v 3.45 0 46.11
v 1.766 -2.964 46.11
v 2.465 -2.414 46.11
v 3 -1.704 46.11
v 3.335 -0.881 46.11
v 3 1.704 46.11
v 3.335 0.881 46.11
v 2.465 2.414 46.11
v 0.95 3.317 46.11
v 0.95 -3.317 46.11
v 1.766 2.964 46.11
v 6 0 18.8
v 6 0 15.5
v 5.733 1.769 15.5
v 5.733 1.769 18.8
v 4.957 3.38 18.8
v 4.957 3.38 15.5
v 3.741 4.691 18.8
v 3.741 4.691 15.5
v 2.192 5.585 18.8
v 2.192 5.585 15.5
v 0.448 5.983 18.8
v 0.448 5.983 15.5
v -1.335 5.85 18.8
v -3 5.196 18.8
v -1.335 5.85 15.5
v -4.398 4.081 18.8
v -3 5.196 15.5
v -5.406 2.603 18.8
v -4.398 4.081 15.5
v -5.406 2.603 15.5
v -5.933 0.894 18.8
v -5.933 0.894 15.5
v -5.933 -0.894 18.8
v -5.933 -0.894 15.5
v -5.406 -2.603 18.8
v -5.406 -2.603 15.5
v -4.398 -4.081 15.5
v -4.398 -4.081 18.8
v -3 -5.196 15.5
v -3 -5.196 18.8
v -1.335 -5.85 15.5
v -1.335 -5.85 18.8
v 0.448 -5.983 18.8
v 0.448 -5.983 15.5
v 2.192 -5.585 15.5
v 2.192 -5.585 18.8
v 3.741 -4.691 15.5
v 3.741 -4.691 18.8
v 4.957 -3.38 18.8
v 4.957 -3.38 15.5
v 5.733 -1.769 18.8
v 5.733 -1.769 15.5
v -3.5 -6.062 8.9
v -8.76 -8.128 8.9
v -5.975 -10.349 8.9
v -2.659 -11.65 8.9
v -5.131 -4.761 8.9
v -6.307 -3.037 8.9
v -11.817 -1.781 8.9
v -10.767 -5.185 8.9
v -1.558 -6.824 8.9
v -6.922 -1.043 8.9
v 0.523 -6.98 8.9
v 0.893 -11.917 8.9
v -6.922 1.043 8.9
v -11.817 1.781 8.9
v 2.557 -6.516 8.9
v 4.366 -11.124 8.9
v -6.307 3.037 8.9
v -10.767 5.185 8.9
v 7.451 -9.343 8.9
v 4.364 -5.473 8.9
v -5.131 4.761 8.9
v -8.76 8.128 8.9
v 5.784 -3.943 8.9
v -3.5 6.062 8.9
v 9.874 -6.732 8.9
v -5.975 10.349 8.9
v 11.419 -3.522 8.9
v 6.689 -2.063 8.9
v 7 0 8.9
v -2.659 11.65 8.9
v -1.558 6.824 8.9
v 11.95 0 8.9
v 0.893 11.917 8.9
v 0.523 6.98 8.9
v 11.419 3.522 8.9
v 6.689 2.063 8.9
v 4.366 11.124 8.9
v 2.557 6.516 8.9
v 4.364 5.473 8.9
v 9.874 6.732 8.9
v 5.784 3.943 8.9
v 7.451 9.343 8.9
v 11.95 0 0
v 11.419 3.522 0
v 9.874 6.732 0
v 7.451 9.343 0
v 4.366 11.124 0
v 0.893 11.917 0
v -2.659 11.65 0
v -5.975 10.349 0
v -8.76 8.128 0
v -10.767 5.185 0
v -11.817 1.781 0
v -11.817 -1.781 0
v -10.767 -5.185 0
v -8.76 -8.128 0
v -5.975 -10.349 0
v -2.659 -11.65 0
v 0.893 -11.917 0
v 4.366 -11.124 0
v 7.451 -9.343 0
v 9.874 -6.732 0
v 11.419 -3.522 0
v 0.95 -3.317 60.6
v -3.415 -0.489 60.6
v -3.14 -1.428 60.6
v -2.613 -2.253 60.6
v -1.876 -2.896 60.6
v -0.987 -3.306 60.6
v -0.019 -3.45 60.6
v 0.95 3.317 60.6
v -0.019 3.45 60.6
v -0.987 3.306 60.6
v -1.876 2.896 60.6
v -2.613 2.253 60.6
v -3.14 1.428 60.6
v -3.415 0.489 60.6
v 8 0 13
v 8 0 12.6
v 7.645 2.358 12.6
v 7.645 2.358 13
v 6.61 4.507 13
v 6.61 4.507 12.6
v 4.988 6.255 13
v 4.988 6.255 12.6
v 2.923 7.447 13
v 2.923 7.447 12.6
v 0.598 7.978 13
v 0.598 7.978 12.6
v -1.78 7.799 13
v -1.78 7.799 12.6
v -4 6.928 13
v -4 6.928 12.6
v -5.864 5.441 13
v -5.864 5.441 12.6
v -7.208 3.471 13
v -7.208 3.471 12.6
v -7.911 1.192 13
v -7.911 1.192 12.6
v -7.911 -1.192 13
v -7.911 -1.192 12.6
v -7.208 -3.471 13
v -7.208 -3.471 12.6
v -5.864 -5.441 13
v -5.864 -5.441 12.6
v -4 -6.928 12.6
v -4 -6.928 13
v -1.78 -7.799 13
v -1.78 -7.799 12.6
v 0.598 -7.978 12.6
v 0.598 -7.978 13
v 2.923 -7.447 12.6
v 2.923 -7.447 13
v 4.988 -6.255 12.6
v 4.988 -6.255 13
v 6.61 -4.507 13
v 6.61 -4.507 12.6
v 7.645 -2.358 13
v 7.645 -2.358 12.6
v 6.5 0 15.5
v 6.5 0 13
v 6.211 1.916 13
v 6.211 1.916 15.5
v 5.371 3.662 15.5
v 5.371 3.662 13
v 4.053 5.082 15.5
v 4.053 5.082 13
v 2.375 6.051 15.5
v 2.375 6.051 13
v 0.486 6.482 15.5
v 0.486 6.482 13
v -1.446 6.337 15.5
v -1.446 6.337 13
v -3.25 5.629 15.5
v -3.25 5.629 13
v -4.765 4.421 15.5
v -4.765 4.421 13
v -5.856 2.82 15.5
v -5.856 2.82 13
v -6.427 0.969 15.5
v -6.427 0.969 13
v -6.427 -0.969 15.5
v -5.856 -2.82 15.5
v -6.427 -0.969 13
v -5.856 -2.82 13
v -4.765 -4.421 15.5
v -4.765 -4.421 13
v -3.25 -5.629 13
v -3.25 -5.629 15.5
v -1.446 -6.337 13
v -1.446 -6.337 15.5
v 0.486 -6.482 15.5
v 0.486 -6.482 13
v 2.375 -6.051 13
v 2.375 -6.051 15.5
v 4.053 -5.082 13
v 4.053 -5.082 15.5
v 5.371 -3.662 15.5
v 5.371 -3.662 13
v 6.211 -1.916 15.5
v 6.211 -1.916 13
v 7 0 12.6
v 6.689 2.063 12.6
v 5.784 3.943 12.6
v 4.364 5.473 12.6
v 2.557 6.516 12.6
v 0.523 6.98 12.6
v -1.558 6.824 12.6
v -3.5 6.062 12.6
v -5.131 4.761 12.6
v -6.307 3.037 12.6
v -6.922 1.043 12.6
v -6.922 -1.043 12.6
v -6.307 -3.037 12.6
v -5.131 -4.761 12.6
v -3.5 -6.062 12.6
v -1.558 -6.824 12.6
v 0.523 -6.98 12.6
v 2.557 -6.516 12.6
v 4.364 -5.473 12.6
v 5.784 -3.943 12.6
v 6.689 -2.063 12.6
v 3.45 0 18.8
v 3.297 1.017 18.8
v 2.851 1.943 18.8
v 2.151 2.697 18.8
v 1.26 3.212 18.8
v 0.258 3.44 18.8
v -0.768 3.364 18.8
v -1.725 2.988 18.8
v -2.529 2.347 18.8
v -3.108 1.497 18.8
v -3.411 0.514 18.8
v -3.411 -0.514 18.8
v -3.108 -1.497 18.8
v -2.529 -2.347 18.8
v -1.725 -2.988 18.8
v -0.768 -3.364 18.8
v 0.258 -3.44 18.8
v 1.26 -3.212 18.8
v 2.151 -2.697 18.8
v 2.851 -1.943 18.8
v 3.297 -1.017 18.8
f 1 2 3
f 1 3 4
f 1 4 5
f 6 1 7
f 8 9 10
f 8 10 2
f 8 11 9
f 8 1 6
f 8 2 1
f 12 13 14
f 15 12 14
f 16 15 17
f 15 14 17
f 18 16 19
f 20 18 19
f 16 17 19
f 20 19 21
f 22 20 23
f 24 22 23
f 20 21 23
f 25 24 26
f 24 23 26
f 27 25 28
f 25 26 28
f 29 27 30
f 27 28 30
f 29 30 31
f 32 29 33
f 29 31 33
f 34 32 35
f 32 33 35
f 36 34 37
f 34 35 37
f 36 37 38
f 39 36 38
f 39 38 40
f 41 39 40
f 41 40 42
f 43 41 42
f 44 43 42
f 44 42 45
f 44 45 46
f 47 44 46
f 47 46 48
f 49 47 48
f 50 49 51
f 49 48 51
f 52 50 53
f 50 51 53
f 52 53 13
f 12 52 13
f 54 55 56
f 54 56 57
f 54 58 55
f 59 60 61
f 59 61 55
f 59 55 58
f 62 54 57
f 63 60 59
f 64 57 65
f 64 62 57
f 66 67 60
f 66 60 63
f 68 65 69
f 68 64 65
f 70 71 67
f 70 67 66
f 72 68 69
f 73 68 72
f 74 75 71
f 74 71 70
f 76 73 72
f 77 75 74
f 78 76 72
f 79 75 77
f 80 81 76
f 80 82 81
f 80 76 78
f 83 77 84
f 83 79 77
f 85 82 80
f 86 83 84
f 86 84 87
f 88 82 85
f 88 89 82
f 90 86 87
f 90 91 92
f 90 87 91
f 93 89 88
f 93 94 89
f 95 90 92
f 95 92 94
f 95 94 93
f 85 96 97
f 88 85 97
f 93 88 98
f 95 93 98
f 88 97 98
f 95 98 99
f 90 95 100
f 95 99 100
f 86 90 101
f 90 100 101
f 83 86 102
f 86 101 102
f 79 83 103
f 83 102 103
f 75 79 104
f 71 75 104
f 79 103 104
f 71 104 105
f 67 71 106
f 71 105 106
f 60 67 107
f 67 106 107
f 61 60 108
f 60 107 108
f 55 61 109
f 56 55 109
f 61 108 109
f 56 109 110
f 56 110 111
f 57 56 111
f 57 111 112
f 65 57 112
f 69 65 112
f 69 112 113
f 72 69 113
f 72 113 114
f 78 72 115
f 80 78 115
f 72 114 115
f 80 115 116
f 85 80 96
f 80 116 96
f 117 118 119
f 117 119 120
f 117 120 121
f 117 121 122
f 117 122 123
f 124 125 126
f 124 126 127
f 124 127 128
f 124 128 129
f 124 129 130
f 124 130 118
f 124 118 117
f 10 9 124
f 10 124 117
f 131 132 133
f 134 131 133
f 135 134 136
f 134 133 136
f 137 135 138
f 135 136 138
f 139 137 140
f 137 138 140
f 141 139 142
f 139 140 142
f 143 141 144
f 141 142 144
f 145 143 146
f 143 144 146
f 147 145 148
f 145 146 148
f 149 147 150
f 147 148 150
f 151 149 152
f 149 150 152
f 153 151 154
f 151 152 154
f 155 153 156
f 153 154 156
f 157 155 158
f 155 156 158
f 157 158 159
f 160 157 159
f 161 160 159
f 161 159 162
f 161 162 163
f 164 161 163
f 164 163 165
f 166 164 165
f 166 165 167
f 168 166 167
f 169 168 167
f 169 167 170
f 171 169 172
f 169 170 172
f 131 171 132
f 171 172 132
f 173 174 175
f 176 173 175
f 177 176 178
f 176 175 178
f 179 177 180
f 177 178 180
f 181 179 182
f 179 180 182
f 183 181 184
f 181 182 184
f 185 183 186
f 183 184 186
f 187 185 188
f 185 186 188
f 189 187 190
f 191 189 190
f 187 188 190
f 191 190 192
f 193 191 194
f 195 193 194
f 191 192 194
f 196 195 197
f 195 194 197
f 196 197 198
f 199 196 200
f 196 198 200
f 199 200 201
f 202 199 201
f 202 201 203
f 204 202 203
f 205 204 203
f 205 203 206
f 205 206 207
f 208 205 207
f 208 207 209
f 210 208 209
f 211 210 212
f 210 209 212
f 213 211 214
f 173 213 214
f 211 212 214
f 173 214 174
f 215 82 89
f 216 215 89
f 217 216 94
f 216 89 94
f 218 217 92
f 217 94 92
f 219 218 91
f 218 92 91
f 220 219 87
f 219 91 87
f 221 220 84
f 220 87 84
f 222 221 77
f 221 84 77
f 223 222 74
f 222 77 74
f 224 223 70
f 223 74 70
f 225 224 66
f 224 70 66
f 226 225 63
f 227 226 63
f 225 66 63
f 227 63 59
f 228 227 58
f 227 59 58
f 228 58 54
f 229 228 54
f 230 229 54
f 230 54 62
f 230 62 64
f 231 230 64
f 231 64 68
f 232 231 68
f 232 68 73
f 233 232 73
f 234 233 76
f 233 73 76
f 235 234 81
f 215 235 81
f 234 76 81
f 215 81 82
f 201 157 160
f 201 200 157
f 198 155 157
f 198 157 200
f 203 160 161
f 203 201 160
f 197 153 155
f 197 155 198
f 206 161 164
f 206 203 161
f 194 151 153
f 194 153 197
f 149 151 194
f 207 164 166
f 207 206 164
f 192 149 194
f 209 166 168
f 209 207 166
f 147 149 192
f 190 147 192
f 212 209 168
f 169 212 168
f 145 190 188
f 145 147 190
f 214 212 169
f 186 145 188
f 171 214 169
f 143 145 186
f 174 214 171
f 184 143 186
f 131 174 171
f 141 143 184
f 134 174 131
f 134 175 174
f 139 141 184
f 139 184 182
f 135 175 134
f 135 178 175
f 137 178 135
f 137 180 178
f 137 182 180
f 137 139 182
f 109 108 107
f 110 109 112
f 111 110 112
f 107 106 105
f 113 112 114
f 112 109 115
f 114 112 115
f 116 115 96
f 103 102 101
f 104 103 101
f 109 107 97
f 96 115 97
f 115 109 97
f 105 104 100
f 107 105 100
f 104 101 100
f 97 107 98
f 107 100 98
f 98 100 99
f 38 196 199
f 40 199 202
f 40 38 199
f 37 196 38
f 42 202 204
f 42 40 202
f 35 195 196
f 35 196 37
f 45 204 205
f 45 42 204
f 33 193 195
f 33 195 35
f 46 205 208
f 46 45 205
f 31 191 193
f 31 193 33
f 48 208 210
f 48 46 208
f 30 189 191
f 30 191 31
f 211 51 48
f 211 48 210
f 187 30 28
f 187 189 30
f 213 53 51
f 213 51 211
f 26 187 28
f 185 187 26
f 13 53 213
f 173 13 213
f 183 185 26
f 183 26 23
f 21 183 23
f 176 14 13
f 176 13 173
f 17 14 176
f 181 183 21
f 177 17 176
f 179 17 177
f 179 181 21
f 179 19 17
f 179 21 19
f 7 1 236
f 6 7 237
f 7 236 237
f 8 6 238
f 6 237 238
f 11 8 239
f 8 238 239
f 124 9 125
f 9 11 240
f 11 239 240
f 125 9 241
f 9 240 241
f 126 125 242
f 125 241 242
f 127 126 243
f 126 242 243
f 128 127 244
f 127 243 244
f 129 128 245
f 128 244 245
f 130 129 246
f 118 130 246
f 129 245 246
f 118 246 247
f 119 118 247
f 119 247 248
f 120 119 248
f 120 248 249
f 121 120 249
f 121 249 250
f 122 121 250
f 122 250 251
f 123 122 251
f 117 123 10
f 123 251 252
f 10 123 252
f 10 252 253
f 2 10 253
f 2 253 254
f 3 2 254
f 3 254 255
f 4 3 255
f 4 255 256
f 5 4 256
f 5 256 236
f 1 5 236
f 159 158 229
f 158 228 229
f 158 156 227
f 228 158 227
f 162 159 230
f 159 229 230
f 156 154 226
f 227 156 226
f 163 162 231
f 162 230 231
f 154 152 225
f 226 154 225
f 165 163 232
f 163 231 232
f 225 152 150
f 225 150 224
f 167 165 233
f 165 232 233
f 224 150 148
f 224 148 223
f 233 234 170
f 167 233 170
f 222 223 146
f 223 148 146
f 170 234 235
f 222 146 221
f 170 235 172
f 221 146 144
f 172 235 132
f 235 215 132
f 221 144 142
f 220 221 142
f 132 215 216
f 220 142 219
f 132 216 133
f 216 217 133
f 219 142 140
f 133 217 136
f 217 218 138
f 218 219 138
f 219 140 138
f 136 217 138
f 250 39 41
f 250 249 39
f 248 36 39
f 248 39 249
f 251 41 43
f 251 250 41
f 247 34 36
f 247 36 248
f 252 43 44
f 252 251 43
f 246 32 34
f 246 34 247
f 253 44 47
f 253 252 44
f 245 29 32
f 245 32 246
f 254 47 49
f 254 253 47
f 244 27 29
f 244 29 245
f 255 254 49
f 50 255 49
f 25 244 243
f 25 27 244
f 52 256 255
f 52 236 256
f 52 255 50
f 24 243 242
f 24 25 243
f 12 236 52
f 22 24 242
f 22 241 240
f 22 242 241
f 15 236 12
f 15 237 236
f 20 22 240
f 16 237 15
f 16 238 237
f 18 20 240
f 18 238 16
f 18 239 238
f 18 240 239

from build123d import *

# Parameters (mm, degrees)
SKETCH2_R           = 11.95
BOSS_EXTRUDE1_DEPTH = 8.9
SKETCH3_R           = 7
BOSS_EXTRUDE2_DEPTH = 3.7
SKETCH5_R           = 8
BOSS_EXTRUDE3_DEPTH = 0.4
SKETCH6_R           = 6.5
BOSS_EXTRUDE4_DEPTH = 2.5
SKETCH7_R           = 6
BOSS_EXTRUDE5_DEPTH = 3.3
SKETCH8_R           = 3.45
BOSS_EXTRUDE6_DEPTH = 41.8
CUT_EXTRUDE2_START  = -14.49
CUT_EXTRUDE2_DEPTH  = 14.49


with BuildPart() as part:
    # Sketch2 → Boss-Extrude1 (new body)
    with BuildSketch(Plane(origin=(0, 0, 0), x_dir=(0, 1, 0), z_dir=(0, 0, 1))):
        with Locations(Location((0, 0, 0), (0, 0, 270))):
            Circle(SKETCH2_R)
    extrude(amount=BOSS_EXTRUDE1_DEPTH)

    # Sketch3 → Boss-Extrude2 (add)
    with BuildSketch(Plane.XY.offset(8.9)):
        Circle(SKETCH3_R)
    extrude(amount=BOSS_EXTRUDE2_DEPTH)

    # Sketch5 → Boss-Extrude3 (add)
    with BuildSketch(Plane.XY.offset(12.6)):
        Circle(SKETCH5_R)
    extrude(amount=BOSS_EXTRUDE3_DEPTH)

    # Sketch6 → Boss-Extrude4 (add)
    with BuildSketch(Plane.XY.offset(13)):
        Circle(SKETCH6_R)
    extrude(amount=BOSS_EXTRUDE4_DEPTH)

    # Sketch7 → Boss-Extrude5 (add)
    with BuildSketch(Plane.XY.offset(15.5)):
        Circle(SKETCH7_R)
    extrude(amount=BOSS_EXTRUDE5_DEPTH)

    # Sketch8 → Boss-Extrude6 (add)
    with BuildSketch(Plane.XY.offset(18.8)):
        Circle(SKETCH8_R)
    extrude(amount=BOSS_EXTRUDE6_DEPTH)

    # Sketch10 → Cut-Extrude2 (cut)
    with BuildSketch(Plane.XY.offset(60.6).offset(CUT_EXTRUDE2_START)):
        with BuildLine():
            Line((0.95, 3.31662479), (0.95, -3.31662479))
            ThreePointArc((0.95, -3.31662479), (3.45, 0), (0.95, 3.31662479))
        make_face()
    extrude(amount=CUT_EXTRUDE2_DEPTH, mode=Mode.SUBTRACT)


solid = part.part
